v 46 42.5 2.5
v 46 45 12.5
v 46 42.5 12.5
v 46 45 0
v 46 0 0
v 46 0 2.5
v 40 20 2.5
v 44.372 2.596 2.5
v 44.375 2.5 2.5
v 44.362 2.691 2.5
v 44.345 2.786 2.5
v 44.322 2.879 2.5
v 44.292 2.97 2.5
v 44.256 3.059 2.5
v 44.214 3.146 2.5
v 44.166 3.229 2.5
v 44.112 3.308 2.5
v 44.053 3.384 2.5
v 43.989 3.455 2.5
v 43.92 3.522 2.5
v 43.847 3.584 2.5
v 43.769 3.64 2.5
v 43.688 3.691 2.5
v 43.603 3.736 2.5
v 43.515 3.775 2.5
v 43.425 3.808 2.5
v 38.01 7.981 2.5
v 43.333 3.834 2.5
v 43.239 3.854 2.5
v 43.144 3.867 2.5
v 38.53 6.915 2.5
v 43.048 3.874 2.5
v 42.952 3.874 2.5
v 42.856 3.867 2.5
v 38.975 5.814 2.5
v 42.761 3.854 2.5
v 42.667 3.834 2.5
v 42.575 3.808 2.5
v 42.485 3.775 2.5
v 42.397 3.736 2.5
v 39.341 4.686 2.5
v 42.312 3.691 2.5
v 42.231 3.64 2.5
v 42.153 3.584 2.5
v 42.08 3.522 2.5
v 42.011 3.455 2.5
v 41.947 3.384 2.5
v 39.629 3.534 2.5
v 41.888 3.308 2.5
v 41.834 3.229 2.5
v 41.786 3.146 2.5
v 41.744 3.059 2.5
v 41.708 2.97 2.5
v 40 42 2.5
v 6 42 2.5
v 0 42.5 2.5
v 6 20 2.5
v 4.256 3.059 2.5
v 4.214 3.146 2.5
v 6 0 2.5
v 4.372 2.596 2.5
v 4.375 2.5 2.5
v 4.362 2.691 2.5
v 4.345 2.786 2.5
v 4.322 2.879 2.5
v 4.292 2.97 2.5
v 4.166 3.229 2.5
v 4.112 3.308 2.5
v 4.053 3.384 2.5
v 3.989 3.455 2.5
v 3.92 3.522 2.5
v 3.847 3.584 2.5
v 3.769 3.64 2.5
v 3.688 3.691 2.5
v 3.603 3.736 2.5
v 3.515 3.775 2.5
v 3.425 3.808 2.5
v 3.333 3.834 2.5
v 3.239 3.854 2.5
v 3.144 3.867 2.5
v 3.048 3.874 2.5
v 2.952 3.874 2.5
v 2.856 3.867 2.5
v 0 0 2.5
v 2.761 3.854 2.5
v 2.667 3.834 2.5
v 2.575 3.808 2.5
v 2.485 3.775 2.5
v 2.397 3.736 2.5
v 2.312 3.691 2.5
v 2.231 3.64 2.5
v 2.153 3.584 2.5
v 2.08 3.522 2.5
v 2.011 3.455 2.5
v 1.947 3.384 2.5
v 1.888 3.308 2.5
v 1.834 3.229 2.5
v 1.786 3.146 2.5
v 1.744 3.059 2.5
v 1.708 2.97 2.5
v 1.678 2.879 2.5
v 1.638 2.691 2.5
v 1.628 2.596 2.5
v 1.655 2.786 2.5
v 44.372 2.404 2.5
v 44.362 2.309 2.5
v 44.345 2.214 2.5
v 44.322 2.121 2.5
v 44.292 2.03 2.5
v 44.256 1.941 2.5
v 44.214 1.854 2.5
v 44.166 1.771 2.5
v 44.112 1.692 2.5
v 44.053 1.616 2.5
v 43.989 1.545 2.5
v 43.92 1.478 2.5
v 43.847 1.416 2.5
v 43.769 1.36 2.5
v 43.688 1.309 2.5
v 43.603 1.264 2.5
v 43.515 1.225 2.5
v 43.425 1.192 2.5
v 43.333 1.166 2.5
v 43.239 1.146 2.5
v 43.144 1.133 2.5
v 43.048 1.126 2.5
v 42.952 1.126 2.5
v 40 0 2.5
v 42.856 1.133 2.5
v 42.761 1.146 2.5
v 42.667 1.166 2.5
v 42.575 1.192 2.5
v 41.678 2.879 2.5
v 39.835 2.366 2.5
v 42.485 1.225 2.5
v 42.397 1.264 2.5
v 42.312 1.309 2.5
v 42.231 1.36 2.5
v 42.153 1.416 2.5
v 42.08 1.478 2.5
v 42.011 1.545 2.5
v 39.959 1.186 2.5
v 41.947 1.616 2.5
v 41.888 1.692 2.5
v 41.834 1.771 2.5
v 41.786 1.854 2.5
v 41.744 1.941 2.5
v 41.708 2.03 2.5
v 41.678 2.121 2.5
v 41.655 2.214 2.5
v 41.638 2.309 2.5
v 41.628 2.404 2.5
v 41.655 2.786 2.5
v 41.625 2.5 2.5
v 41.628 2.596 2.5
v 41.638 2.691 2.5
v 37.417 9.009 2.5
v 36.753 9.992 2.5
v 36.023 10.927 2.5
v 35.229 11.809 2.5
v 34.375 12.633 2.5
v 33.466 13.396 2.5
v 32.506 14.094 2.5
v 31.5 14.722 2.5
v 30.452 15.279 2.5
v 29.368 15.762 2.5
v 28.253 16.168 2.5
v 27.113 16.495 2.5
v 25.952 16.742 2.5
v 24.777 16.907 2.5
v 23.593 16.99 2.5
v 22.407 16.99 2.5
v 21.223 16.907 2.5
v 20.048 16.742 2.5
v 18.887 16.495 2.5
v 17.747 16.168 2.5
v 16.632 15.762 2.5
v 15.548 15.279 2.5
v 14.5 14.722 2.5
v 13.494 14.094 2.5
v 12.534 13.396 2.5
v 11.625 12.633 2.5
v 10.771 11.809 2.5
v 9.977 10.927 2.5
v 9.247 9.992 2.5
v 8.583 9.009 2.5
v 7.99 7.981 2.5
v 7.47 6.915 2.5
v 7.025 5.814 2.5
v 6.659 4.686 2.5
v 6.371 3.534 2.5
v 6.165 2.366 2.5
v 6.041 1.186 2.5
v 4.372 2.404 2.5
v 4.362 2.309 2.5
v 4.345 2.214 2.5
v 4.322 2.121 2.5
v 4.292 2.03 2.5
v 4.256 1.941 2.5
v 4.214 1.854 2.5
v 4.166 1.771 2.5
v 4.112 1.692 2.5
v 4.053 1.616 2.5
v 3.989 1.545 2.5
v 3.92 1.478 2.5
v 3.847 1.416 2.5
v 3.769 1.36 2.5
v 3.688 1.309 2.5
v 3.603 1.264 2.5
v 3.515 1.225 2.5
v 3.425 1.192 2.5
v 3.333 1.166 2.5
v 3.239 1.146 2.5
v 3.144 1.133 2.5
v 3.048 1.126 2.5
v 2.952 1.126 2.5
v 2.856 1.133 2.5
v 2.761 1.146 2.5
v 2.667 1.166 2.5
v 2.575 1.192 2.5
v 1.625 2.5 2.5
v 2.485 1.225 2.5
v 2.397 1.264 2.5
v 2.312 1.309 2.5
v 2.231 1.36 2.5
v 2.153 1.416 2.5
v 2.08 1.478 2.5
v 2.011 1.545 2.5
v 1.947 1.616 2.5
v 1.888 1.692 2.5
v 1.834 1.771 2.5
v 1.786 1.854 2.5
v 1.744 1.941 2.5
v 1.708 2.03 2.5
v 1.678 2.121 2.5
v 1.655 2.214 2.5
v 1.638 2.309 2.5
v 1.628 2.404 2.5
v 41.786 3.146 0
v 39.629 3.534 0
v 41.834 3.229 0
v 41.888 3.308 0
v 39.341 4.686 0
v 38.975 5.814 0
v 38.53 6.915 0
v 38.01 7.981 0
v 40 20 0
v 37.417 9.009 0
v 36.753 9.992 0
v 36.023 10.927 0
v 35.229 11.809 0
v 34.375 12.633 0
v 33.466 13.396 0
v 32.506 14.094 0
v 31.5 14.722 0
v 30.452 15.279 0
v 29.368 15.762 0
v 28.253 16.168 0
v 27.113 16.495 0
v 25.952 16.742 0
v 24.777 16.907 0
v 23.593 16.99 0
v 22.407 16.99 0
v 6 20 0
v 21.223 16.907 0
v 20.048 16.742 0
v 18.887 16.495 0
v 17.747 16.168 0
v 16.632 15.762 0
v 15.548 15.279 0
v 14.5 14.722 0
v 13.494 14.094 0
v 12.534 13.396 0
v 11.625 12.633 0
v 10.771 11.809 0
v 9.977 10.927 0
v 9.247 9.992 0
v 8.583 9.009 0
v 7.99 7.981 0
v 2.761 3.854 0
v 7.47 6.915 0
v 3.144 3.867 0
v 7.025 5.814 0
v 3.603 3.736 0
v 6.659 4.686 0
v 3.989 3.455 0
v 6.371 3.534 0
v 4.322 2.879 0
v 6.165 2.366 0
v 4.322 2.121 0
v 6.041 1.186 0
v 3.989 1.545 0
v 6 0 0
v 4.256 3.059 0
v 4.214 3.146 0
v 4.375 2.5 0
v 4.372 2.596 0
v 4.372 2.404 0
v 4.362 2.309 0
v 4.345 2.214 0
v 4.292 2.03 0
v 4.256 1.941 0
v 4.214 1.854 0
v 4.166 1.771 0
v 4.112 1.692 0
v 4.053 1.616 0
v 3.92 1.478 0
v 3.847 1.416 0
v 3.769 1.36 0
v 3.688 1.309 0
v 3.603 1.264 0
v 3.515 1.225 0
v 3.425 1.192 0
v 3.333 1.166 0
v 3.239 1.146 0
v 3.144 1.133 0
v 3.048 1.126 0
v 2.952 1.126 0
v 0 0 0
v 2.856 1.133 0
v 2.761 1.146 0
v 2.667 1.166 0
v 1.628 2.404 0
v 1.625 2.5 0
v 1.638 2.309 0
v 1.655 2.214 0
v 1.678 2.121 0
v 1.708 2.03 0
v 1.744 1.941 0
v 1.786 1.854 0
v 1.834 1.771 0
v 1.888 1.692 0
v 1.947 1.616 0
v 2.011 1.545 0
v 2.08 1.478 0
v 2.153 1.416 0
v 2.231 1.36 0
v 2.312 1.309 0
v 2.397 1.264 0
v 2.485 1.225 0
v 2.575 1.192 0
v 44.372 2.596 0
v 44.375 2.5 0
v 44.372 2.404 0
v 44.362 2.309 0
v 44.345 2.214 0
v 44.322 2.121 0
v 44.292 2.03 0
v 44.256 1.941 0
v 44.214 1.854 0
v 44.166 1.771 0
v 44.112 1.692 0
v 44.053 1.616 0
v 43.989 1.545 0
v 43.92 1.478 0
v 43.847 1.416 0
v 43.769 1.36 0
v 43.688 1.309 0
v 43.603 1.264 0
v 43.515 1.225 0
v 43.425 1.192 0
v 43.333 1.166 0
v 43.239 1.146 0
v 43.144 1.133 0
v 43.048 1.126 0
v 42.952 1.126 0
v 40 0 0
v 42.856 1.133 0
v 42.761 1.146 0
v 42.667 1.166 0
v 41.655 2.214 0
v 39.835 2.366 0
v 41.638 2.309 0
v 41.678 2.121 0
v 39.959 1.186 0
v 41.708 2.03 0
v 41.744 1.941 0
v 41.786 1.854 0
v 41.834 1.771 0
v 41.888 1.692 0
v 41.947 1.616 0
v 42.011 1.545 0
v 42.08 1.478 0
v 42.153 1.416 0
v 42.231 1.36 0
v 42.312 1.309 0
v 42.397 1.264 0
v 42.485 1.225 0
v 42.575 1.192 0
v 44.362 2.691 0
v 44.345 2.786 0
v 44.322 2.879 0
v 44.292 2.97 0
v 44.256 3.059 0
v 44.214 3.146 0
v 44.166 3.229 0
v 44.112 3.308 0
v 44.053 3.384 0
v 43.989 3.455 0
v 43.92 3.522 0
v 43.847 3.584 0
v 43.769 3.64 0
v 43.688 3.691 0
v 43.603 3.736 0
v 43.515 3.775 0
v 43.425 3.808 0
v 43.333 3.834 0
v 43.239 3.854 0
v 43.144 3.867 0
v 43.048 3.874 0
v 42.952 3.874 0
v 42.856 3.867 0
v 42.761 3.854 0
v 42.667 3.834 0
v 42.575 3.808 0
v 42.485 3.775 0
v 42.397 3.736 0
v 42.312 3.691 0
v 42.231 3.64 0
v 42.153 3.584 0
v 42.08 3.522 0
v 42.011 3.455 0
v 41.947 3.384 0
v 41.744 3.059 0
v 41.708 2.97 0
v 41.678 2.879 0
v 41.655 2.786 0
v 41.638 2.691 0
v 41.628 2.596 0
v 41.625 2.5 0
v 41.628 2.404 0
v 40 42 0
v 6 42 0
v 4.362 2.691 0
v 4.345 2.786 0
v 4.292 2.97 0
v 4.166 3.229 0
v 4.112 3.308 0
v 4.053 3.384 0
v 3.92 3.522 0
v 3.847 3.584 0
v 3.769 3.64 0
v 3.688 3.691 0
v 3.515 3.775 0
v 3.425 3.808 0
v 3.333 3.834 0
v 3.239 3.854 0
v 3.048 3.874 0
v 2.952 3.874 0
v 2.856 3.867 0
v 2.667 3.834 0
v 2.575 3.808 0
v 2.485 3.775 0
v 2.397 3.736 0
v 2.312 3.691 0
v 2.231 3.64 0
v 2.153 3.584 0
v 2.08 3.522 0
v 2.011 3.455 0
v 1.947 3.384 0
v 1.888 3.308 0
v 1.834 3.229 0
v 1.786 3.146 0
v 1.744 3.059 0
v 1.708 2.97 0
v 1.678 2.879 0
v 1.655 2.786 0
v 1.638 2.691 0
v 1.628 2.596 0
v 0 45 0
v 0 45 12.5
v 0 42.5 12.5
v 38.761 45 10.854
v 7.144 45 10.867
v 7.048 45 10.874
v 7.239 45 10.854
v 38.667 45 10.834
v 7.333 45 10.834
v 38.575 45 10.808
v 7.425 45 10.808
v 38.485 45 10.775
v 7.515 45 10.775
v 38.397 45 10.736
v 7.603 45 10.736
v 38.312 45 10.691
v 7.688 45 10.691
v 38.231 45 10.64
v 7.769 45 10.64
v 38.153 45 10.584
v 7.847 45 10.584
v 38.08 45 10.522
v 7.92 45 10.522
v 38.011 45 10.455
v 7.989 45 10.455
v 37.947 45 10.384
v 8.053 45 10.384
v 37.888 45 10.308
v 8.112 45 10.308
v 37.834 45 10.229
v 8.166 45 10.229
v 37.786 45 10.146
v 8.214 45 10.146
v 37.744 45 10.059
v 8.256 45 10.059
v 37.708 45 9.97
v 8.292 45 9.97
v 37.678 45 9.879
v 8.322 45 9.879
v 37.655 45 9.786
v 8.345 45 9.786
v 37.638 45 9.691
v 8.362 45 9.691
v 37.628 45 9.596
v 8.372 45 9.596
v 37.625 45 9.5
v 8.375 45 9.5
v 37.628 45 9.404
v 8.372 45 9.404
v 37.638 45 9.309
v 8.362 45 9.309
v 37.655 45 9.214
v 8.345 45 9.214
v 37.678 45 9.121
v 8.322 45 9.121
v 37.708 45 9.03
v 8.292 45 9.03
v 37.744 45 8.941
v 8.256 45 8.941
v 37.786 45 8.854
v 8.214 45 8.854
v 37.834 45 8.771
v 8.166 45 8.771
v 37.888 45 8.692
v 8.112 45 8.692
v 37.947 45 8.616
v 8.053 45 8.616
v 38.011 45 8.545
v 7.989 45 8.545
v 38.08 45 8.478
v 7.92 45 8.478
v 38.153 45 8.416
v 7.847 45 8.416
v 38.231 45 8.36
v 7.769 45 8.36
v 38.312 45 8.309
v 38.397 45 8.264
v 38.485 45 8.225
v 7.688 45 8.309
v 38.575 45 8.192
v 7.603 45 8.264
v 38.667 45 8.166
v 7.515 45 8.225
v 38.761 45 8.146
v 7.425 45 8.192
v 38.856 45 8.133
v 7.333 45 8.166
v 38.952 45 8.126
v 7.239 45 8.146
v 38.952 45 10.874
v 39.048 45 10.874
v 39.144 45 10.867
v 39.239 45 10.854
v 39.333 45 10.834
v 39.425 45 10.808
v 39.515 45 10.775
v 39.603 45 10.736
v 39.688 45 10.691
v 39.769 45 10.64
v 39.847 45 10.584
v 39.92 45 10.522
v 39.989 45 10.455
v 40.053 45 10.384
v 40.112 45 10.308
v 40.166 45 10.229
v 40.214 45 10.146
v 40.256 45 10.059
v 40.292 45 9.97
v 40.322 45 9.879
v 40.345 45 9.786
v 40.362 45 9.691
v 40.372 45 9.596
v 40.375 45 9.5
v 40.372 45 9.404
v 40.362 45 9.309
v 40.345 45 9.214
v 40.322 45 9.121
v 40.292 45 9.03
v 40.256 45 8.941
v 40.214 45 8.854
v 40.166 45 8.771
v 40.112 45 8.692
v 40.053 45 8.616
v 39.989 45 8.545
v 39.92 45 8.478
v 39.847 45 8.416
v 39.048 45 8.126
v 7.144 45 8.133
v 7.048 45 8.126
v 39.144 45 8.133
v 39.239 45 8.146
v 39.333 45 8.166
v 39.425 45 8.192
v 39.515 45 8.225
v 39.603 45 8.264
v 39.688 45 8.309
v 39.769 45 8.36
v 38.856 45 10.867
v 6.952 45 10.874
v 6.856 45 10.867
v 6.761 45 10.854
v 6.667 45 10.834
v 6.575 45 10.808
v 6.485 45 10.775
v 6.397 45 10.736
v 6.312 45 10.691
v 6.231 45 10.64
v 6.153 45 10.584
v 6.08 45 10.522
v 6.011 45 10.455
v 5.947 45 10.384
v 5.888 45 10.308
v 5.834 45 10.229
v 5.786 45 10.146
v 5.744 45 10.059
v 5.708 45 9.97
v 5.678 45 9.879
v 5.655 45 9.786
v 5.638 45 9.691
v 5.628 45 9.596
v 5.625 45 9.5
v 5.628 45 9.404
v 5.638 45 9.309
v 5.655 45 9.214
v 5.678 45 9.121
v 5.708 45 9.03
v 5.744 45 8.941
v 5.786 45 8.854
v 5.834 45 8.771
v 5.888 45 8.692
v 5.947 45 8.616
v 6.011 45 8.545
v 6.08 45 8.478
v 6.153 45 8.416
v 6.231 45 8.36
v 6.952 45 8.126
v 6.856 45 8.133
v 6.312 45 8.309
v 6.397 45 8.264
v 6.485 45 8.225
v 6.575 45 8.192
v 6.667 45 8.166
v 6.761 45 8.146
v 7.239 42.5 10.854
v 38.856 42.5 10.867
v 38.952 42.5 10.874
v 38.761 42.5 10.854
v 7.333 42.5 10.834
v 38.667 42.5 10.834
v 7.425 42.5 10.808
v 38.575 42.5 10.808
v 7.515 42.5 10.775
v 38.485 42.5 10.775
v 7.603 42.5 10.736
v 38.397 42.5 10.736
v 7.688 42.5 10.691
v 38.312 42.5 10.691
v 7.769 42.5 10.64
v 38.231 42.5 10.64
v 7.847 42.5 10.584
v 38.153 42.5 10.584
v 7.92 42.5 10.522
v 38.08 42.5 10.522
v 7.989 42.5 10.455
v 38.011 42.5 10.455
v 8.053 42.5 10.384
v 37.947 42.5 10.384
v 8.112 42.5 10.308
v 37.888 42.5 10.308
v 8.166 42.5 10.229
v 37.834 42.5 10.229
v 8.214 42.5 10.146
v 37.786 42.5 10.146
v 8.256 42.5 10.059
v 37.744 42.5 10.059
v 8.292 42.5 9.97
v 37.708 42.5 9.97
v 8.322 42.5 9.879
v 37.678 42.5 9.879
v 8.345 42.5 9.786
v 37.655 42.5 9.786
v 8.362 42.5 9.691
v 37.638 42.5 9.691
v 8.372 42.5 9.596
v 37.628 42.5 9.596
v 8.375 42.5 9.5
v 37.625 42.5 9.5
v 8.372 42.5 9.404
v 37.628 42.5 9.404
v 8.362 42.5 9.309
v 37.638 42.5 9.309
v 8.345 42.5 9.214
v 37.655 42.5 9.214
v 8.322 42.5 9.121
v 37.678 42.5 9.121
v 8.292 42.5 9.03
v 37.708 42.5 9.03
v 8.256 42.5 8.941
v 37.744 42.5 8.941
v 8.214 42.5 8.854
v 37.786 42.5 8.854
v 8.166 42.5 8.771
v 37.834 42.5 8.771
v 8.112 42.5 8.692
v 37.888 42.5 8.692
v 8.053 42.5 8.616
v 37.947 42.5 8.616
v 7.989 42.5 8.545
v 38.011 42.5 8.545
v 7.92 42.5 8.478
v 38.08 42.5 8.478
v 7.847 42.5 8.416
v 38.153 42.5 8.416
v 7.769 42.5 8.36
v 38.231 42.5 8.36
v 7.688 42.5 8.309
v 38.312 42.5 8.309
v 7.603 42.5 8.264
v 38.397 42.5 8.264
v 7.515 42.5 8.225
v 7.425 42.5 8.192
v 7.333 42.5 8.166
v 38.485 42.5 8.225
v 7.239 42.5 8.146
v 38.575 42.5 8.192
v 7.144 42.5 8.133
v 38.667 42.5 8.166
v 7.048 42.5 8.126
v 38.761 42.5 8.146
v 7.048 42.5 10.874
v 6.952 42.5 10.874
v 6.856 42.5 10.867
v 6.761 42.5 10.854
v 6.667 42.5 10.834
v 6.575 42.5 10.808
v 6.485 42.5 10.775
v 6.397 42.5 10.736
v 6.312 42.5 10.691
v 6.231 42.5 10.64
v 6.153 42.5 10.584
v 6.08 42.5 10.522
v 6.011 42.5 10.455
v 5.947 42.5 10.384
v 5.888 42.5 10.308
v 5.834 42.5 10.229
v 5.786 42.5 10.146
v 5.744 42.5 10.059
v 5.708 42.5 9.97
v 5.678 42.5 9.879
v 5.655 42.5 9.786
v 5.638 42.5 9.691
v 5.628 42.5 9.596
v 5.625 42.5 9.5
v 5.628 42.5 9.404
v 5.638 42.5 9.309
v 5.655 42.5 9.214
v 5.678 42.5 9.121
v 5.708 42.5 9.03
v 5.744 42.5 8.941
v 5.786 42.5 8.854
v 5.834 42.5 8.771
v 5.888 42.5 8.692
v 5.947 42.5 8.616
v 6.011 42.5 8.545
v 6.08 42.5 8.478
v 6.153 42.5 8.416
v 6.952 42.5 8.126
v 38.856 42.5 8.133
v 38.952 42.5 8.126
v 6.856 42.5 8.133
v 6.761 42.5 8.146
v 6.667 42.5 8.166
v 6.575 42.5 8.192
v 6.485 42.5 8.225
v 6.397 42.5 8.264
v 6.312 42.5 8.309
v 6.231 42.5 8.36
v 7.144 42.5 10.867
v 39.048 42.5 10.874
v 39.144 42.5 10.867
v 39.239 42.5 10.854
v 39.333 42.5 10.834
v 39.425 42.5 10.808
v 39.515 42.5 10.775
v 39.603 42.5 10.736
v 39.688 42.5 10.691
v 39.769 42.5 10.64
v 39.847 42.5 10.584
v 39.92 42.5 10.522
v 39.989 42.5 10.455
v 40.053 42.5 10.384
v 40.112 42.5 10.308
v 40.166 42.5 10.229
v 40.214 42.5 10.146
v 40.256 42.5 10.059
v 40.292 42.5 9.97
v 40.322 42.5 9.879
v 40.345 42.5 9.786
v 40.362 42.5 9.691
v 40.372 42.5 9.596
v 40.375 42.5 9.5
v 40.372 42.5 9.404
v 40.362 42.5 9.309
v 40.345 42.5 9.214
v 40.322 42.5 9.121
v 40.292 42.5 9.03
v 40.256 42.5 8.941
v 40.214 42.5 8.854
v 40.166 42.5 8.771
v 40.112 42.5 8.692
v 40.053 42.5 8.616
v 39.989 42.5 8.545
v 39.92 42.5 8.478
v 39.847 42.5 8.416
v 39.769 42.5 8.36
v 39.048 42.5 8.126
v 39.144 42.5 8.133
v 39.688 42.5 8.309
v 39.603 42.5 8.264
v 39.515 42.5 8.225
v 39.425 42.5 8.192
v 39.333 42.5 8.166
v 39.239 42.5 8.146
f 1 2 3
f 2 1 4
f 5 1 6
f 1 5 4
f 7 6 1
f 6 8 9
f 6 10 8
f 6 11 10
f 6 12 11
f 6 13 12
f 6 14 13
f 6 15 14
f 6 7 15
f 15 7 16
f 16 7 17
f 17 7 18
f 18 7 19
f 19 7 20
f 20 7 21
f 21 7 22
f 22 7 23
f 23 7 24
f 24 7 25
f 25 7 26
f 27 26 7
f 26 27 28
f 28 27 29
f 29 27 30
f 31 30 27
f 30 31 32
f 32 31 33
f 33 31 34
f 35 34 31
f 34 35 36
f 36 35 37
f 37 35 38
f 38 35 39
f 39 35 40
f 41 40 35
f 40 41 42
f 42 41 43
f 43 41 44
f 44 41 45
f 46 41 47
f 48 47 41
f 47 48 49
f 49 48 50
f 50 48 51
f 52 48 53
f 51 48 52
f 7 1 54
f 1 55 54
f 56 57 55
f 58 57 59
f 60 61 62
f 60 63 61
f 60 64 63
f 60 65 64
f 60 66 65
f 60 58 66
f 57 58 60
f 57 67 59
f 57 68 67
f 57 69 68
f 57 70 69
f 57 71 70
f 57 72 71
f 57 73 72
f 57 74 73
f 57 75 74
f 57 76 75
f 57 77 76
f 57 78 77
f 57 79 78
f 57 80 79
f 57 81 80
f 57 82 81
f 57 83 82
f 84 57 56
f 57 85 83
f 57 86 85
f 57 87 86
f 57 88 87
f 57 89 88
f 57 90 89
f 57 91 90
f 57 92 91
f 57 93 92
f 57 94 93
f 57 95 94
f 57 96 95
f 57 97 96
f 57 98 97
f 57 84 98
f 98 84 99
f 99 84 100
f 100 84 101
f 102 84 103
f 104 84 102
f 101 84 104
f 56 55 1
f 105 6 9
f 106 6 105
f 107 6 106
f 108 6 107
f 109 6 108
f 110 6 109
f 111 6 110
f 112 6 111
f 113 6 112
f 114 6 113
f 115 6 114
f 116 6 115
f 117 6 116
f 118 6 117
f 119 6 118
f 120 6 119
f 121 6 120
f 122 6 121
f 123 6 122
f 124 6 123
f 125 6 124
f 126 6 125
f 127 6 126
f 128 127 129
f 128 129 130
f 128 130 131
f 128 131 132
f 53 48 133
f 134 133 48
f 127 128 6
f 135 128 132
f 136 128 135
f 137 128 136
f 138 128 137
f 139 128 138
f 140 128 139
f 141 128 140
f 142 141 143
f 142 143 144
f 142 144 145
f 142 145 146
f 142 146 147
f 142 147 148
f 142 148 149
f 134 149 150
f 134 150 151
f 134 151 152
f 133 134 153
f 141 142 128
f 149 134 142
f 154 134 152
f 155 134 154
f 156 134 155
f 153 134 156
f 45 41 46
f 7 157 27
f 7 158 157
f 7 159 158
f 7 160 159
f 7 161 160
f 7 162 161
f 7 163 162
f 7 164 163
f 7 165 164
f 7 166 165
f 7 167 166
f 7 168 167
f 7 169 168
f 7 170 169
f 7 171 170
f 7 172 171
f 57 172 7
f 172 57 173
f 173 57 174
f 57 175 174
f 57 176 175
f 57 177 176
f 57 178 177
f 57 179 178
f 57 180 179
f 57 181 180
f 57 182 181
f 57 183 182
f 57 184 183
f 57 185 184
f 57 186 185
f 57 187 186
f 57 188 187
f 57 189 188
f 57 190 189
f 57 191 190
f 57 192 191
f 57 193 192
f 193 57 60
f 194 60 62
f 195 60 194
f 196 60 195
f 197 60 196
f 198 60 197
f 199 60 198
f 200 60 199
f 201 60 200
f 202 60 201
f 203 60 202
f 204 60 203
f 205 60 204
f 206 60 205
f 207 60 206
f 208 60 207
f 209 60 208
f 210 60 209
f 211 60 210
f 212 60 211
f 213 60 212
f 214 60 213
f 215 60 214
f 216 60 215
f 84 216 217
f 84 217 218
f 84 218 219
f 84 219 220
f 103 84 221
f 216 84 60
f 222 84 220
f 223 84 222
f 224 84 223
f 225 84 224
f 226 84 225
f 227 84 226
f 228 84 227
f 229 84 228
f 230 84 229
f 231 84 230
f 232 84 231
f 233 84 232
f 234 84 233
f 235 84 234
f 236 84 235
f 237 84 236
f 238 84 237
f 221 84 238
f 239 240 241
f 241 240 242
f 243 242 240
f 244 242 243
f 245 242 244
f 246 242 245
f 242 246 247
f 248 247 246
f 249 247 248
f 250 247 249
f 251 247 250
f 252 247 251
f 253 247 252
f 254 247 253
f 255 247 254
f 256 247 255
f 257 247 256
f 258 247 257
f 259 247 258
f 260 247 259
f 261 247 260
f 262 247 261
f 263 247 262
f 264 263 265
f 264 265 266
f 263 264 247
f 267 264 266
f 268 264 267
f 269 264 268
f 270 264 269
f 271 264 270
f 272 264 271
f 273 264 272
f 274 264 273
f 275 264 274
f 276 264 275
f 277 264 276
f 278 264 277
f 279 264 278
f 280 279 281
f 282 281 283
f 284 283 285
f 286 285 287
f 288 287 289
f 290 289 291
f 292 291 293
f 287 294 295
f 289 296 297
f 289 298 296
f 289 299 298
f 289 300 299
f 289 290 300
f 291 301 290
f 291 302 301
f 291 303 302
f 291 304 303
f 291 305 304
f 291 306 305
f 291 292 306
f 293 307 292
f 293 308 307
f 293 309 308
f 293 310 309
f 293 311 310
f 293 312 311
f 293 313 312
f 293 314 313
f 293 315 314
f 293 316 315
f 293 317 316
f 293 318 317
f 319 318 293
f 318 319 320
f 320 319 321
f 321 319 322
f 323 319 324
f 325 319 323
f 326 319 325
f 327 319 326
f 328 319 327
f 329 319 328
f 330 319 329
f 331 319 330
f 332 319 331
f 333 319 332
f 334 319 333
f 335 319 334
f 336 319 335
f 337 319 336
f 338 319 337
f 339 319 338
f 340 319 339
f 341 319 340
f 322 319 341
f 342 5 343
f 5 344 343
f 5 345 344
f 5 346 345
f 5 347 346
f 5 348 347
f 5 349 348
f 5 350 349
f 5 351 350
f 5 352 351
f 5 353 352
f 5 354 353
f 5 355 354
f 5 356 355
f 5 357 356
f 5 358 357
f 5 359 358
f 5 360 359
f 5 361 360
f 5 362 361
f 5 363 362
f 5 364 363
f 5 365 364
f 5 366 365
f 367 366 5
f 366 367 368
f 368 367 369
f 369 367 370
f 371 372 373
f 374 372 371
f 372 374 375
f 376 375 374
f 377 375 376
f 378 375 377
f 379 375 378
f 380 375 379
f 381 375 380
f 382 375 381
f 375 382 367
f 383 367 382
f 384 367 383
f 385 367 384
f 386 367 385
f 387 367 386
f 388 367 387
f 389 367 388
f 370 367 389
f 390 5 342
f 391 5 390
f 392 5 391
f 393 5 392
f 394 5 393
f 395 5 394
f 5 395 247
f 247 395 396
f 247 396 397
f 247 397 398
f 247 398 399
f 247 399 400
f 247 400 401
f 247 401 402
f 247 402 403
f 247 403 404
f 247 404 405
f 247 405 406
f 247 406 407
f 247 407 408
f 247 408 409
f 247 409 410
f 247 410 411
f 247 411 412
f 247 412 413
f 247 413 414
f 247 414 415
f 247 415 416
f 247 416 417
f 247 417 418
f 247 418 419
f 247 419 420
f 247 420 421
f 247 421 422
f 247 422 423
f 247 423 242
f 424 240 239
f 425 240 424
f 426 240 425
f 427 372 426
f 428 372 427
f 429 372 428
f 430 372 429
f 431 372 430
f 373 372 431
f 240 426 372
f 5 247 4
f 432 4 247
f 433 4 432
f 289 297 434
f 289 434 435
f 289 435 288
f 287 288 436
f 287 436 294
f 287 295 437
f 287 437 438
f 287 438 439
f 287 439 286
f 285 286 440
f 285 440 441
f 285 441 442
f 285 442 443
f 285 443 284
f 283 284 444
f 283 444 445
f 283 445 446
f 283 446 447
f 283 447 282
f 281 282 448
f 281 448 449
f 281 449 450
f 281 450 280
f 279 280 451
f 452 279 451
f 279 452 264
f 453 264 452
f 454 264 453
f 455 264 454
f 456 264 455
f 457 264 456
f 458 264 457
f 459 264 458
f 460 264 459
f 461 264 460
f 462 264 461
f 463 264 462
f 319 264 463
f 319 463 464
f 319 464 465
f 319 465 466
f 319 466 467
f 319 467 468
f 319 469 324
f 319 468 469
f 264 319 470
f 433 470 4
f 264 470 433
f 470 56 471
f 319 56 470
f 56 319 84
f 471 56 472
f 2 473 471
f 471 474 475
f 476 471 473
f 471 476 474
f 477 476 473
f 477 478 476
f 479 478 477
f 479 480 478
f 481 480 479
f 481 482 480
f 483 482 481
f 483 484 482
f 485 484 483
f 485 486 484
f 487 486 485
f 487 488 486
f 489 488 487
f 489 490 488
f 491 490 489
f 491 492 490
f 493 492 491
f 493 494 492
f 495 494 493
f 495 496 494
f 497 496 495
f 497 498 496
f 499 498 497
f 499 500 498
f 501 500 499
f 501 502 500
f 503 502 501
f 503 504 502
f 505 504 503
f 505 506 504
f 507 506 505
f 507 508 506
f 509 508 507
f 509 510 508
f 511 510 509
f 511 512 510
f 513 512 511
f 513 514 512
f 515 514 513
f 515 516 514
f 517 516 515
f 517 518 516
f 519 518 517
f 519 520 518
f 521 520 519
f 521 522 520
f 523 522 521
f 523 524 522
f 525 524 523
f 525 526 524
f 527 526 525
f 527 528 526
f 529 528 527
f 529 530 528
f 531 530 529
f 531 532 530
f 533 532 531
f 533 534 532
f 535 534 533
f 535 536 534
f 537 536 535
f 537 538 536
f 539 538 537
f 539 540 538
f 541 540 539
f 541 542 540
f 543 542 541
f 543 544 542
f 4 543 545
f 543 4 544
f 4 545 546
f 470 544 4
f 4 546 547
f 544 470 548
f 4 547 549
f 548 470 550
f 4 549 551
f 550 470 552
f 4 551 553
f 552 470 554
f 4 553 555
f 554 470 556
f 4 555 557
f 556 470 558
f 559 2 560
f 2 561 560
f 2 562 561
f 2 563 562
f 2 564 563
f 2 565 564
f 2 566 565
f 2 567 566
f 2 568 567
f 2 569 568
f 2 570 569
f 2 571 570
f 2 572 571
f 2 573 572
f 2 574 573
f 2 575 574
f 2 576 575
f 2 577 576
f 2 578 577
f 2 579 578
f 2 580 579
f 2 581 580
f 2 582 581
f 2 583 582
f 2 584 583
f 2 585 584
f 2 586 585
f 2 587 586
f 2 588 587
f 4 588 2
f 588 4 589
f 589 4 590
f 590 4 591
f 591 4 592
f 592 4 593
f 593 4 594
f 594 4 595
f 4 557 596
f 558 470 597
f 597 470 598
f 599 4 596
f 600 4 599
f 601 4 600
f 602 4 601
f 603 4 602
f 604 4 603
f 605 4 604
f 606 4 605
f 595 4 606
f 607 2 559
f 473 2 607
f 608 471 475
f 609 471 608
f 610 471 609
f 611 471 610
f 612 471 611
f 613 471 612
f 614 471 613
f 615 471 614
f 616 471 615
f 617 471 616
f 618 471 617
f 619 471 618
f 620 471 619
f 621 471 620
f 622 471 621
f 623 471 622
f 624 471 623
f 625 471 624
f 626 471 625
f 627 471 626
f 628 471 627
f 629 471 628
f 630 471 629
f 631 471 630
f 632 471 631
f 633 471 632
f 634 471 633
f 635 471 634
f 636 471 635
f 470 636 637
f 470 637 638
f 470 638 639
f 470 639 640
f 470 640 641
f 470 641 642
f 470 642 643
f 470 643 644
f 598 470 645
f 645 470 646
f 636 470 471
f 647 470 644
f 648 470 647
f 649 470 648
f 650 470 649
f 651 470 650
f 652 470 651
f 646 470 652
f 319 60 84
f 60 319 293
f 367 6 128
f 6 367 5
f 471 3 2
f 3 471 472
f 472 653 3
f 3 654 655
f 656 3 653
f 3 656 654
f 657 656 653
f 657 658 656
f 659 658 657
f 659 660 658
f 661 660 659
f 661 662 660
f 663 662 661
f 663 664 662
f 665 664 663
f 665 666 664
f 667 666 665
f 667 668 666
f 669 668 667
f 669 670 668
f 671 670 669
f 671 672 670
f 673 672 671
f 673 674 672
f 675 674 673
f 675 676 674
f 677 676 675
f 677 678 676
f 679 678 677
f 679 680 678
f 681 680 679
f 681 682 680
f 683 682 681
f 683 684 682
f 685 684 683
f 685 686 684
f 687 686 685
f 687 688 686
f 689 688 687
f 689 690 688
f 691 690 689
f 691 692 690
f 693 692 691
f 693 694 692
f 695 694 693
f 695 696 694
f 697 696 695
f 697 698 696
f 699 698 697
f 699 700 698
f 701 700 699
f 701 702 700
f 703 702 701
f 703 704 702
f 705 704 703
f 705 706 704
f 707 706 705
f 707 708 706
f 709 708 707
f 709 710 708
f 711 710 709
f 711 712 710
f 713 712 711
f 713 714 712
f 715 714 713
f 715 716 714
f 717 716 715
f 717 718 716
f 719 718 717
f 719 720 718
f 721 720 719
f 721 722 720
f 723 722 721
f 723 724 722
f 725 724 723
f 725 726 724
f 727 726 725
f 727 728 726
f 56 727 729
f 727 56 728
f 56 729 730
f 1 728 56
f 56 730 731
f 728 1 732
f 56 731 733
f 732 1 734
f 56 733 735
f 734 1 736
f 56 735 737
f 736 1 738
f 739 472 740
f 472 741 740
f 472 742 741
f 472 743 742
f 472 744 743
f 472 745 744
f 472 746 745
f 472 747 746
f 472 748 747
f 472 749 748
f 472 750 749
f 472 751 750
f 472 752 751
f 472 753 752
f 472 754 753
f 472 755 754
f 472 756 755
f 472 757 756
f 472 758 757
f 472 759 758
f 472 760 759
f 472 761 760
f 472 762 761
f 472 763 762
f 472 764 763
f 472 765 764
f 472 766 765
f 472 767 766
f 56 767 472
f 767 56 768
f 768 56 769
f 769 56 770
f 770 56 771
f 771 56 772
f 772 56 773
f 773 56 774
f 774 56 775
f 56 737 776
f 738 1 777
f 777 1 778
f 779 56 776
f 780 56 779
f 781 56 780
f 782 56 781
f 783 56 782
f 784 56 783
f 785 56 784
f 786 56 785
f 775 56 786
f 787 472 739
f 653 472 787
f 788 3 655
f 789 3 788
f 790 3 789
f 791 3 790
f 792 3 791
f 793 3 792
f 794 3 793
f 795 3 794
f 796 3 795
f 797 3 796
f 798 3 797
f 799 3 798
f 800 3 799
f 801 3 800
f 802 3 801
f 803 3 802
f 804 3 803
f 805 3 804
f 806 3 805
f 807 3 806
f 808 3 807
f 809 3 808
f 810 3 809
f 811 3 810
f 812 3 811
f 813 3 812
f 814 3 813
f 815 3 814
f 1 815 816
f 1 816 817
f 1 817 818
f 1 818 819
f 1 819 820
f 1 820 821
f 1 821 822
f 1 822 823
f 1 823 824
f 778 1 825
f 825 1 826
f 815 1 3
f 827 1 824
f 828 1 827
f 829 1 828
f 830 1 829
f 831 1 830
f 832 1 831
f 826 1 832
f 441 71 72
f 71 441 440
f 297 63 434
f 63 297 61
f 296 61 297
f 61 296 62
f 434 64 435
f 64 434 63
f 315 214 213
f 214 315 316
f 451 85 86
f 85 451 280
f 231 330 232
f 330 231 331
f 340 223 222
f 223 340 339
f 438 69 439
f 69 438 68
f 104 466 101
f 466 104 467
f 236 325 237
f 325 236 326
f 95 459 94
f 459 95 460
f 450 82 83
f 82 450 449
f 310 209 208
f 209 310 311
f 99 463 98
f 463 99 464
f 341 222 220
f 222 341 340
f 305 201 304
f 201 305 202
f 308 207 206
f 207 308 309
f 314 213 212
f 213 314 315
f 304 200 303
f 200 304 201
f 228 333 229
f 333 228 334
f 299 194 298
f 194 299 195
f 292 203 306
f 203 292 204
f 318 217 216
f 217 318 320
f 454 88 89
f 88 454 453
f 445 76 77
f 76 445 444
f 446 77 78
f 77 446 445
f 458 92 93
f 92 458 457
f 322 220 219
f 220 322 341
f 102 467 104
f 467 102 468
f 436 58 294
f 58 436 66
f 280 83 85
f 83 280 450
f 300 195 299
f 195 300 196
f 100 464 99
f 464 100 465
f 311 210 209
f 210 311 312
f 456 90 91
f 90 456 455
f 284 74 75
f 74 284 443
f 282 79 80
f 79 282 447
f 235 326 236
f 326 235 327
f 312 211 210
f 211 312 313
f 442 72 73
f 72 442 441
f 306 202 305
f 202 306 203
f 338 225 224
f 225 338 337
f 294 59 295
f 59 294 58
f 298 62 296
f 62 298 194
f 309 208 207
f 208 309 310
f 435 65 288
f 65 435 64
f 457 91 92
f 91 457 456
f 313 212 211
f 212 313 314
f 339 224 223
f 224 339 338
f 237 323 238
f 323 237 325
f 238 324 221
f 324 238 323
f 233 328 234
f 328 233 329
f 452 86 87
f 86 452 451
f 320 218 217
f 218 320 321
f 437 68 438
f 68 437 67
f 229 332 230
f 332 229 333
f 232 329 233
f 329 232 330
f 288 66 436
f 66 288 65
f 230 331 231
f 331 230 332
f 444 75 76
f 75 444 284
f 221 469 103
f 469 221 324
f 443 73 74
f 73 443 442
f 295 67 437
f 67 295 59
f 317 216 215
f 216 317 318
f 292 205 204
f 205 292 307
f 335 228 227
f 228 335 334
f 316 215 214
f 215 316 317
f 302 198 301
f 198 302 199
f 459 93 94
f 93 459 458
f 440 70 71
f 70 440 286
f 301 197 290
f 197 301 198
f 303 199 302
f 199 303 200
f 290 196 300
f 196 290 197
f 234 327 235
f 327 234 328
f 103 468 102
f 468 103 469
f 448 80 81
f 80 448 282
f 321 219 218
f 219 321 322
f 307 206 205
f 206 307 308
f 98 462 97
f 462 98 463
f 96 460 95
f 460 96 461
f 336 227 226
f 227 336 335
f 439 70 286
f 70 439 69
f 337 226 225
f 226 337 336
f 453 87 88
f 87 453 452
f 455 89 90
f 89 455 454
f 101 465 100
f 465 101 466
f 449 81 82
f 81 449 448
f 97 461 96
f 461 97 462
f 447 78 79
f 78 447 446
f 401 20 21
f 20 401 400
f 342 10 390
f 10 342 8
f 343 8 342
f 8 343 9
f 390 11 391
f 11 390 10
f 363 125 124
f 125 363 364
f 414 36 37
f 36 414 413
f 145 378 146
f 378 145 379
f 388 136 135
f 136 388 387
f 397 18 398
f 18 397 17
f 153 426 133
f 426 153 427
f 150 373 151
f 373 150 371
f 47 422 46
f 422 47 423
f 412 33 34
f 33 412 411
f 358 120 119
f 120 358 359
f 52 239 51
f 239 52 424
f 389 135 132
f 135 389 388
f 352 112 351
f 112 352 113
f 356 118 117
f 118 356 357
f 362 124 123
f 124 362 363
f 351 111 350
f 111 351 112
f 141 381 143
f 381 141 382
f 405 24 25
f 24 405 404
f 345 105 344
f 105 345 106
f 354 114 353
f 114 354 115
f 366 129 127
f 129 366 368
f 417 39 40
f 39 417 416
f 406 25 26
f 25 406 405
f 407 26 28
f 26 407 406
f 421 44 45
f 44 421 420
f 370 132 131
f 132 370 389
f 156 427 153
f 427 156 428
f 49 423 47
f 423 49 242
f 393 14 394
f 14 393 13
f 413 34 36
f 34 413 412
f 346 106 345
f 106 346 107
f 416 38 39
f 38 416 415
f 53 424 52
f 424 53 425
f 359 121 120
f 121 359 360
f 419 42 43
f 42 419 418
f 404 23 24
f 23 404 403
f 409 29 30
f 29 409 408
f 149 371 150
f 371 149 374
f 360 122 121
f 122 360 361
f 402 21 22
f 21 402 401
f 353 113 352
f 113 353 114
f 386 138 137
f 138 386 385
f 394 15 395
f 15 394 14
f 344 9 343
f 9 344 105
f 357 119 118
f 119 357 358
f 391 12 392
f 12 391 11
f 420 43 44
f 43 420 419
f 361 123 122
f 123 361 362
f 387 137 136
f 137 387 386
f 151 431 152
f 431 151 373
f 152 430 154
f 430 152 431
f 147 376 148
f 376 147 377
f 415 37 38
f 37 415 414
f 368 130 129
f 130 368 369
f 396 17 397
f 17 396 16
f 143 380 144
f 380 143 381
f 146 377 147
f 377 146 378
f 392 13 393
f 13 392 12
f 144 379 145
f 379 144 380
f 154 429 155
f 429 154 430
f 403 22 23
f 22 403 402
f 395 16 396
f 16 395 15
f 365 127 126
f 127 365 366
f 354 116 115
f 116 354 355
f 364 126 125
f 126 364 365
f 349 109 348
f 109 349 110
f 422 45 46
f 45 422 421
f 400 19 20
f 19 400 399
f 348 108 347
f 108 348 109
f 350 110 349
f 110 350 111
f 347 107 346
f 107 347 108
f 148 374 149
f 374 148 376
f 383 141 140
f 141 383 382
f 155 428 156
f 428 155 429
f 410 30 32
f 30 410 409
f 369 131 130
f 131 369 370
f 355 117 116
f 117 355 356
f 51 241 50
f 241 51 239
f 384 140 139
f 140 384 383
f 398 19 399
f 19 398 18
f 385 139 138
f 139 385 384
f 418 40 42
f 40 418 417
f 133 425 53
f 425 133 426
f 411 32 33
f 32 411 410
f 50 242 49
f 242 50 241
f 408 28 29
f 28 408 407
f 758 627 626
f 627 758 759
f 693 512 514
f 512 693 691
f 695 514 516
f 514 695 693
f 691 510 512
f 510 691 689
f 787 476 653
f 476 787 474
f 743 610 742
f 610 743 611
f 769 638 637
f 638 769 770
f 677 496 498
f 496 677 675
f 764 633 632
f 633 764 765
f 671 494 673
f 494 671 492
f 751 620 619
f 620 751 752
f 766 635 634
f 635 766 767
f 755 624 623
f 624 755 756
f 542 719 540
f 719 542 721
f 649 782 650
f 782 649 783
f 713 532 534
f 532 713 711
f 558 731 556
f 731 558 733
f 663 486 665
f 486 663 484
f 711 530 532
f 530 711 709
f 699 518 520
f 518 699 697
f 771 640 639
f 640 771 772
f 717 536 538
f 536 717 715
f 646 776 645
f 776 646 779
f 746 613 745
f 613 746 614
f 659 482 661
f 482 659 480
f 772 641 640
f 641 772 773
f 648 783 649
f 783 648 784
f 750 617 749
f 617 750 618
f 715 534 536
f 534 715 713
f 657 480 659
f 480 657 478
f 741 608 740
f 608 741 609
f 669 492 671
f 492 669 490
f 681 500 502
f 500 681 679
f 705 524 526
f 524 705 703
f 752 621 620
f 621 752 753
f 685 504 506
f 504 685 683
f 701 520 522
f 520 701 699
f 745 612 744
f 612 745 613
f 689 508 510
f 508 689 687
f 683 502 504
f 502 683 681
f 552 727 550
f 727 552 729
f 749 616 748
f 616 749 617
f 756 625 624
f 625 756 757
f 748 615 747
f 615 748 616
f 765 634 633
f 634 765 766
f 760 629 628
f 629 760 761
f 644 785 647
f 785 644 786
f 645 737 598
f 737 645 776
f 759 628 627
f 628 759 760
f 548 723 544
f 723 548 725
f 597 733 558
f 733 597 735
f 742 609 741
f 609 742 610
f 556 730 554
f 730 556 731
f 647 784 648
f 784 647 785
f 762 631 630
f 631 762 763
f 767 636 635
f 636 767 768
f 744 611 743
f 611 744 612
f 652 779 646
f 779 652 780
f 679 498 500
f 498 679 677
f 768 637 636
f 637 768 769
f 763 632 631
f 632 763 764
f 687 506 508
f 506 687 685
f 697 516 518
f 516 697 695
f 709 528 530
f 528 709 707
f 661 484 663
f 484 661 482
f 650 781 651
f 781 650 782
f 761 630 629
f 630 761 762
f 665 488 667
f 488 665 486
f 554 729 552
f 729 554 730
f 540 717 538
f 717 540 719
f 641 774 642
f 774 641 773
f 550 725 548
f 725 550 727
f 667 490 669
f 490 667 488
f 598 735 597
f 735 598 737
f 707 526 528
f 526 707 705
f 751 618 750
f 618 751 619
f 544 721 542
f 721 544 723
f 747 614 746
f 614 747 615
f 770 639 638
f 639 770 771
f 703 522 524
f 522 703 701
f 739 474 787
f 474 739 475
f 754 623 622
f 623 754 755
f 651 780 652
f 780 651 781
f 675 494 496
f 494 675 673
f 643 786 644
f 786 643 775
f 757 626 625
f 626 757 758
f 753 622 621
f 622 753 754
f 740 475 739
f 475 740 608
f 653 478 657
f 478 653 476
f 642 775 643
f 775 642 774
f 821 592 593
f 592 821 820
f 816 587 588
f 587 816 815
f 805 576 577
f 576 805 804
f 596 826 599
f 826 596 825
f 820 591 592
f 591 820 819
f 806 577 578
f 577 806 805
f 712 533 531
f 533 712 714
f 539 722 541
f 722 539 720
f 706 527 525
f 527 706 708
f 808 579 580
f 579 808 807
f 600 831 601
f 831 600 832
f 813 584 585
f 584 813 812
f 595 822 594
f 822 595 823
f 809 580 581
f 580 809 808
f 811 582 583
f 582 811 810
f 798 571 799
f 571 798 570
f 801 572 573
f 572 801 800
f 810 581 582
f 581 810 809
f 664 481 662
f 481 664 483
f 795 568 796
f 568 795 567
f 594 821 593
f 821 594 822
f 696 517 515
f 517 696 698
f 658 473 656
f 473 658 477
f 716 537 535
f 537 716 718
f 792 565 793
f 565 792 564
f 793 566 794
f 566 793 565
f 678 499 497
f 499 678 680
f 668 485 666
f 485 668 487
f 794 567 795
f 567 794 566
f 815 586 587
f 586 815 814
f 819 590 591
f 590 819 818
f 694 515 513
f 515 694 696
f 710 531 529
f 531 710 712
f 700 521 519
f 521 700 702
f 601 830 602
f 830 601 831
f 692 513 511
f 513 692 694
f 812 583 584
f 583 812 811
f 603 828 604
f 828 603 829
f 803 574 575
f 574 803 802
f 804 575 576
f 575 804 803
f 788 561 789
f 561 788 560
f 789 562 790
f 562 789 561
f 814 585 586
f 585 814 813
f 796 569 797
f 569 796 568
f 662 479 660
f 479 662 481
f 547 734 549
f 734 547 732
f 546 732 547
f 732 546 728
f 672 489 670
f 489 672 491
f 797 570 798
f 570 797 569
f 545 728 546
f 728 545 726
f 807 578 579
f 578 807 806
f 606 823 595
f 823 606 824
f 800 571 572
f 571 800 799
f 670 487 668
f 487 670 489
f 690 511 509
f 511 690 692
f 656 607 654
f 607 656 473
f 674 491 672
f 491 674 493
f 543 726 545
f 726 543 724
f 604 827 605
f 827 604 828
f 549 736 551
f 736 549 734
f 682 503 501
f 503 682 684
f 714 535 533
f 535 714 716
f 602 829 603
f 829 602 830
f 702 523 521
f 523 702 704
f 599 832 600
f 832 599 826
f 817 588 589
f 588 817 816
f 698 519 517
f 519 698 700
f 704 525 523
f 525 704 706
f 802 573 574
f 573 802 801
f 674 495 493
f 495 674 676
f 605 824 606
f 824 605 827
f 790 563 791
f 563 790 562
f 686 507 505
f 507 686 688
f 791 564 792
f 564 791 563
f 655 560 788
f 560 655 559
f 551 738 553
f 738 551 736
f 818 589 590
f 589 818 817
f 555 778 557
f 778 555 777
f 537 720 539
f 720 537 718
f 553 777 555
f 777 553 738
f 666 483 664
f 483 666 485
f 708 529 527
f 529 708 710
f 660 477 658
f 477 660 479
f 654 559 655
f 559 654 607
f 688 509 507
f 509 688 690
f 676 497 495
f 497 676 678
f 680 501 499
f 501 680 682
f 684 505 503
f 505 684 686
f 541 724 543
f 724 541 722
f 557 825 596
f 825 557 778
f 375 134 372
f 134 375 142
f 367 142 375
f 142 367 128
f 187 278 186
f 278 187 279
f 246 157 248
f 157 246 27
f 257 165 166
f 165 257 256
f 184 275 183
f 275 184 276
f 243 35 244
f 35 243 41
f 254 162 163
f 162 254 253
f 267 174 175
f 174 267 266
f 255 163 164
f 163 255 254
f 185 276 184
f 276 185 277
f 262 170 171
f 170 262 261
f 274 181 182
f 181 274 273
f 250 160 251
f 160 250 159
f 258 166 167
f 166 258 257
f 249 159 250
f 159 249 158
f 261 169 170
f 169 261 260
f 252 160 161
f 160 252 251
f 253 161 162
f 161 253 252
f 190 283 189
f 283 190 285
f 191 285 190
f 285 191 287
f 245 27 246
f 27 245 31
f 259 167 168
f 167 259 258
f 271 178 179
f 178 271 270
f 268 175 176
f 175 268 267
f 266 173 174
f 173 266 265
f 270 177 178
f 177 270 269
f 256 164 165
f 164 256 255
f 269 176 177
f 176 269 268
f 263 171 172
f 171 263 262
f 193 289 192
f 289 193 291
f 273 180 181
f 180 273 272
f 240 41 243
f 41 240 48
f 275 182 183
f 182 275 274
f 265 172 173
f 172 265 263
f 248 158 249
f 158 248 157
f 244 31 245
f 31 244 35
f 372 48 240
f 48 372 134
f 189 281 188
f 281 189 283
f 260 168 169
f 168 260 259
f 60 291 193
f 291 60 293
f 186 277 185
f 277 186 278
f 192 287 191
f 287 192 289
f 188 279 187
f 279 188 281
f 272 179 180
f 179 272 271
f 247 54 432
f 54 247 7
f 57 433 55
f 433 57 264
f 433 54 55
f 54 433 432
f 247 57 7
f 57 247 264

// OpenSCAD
$fn = 90;

// Placa
lx = 46;
ly = 45;
lz = 2.5;

// Bracket
lx1 = lx;
ly1 = 2.5;
lz1 = 10;
rb = 17;

// Tornillos placa
r = 2.75/2;
d = 20;

// Tornillos bracket
r1 = r;
d1 = 32/2;
h1 = lz1 - 3;

difference() {
  union() {
    cube([lx, ly, lz]);
    translate([0, ly - ly1, lz]) cube([lx1, ly1, lz1]);
  }

  // Tornillos placa
  translate([lx/2 - d, 2.5, 0]) cylinder(r=r, h=lz);
  translate([lx/2 + d, 2.5, 0]) cylinder(r=r, h=lz);

  // Tornillos placa
  translate([lx/2 - d1, ly, lz + h1]) rotate([90, 0, 0]) cylinder(r=r1, h=ly1);
  translate([lx/2 + d1, ly, lz + h1]) rotate([90, 0, 0]) cylinder(r=r1, h=ly1);

  // Agujeros
  translate([lx/2, 0, 0]) cylinder(r=rb, h=lz);
  translate([lx/2 - rb, 20, 0]) cube([2*rb, 22, lz]);
}
